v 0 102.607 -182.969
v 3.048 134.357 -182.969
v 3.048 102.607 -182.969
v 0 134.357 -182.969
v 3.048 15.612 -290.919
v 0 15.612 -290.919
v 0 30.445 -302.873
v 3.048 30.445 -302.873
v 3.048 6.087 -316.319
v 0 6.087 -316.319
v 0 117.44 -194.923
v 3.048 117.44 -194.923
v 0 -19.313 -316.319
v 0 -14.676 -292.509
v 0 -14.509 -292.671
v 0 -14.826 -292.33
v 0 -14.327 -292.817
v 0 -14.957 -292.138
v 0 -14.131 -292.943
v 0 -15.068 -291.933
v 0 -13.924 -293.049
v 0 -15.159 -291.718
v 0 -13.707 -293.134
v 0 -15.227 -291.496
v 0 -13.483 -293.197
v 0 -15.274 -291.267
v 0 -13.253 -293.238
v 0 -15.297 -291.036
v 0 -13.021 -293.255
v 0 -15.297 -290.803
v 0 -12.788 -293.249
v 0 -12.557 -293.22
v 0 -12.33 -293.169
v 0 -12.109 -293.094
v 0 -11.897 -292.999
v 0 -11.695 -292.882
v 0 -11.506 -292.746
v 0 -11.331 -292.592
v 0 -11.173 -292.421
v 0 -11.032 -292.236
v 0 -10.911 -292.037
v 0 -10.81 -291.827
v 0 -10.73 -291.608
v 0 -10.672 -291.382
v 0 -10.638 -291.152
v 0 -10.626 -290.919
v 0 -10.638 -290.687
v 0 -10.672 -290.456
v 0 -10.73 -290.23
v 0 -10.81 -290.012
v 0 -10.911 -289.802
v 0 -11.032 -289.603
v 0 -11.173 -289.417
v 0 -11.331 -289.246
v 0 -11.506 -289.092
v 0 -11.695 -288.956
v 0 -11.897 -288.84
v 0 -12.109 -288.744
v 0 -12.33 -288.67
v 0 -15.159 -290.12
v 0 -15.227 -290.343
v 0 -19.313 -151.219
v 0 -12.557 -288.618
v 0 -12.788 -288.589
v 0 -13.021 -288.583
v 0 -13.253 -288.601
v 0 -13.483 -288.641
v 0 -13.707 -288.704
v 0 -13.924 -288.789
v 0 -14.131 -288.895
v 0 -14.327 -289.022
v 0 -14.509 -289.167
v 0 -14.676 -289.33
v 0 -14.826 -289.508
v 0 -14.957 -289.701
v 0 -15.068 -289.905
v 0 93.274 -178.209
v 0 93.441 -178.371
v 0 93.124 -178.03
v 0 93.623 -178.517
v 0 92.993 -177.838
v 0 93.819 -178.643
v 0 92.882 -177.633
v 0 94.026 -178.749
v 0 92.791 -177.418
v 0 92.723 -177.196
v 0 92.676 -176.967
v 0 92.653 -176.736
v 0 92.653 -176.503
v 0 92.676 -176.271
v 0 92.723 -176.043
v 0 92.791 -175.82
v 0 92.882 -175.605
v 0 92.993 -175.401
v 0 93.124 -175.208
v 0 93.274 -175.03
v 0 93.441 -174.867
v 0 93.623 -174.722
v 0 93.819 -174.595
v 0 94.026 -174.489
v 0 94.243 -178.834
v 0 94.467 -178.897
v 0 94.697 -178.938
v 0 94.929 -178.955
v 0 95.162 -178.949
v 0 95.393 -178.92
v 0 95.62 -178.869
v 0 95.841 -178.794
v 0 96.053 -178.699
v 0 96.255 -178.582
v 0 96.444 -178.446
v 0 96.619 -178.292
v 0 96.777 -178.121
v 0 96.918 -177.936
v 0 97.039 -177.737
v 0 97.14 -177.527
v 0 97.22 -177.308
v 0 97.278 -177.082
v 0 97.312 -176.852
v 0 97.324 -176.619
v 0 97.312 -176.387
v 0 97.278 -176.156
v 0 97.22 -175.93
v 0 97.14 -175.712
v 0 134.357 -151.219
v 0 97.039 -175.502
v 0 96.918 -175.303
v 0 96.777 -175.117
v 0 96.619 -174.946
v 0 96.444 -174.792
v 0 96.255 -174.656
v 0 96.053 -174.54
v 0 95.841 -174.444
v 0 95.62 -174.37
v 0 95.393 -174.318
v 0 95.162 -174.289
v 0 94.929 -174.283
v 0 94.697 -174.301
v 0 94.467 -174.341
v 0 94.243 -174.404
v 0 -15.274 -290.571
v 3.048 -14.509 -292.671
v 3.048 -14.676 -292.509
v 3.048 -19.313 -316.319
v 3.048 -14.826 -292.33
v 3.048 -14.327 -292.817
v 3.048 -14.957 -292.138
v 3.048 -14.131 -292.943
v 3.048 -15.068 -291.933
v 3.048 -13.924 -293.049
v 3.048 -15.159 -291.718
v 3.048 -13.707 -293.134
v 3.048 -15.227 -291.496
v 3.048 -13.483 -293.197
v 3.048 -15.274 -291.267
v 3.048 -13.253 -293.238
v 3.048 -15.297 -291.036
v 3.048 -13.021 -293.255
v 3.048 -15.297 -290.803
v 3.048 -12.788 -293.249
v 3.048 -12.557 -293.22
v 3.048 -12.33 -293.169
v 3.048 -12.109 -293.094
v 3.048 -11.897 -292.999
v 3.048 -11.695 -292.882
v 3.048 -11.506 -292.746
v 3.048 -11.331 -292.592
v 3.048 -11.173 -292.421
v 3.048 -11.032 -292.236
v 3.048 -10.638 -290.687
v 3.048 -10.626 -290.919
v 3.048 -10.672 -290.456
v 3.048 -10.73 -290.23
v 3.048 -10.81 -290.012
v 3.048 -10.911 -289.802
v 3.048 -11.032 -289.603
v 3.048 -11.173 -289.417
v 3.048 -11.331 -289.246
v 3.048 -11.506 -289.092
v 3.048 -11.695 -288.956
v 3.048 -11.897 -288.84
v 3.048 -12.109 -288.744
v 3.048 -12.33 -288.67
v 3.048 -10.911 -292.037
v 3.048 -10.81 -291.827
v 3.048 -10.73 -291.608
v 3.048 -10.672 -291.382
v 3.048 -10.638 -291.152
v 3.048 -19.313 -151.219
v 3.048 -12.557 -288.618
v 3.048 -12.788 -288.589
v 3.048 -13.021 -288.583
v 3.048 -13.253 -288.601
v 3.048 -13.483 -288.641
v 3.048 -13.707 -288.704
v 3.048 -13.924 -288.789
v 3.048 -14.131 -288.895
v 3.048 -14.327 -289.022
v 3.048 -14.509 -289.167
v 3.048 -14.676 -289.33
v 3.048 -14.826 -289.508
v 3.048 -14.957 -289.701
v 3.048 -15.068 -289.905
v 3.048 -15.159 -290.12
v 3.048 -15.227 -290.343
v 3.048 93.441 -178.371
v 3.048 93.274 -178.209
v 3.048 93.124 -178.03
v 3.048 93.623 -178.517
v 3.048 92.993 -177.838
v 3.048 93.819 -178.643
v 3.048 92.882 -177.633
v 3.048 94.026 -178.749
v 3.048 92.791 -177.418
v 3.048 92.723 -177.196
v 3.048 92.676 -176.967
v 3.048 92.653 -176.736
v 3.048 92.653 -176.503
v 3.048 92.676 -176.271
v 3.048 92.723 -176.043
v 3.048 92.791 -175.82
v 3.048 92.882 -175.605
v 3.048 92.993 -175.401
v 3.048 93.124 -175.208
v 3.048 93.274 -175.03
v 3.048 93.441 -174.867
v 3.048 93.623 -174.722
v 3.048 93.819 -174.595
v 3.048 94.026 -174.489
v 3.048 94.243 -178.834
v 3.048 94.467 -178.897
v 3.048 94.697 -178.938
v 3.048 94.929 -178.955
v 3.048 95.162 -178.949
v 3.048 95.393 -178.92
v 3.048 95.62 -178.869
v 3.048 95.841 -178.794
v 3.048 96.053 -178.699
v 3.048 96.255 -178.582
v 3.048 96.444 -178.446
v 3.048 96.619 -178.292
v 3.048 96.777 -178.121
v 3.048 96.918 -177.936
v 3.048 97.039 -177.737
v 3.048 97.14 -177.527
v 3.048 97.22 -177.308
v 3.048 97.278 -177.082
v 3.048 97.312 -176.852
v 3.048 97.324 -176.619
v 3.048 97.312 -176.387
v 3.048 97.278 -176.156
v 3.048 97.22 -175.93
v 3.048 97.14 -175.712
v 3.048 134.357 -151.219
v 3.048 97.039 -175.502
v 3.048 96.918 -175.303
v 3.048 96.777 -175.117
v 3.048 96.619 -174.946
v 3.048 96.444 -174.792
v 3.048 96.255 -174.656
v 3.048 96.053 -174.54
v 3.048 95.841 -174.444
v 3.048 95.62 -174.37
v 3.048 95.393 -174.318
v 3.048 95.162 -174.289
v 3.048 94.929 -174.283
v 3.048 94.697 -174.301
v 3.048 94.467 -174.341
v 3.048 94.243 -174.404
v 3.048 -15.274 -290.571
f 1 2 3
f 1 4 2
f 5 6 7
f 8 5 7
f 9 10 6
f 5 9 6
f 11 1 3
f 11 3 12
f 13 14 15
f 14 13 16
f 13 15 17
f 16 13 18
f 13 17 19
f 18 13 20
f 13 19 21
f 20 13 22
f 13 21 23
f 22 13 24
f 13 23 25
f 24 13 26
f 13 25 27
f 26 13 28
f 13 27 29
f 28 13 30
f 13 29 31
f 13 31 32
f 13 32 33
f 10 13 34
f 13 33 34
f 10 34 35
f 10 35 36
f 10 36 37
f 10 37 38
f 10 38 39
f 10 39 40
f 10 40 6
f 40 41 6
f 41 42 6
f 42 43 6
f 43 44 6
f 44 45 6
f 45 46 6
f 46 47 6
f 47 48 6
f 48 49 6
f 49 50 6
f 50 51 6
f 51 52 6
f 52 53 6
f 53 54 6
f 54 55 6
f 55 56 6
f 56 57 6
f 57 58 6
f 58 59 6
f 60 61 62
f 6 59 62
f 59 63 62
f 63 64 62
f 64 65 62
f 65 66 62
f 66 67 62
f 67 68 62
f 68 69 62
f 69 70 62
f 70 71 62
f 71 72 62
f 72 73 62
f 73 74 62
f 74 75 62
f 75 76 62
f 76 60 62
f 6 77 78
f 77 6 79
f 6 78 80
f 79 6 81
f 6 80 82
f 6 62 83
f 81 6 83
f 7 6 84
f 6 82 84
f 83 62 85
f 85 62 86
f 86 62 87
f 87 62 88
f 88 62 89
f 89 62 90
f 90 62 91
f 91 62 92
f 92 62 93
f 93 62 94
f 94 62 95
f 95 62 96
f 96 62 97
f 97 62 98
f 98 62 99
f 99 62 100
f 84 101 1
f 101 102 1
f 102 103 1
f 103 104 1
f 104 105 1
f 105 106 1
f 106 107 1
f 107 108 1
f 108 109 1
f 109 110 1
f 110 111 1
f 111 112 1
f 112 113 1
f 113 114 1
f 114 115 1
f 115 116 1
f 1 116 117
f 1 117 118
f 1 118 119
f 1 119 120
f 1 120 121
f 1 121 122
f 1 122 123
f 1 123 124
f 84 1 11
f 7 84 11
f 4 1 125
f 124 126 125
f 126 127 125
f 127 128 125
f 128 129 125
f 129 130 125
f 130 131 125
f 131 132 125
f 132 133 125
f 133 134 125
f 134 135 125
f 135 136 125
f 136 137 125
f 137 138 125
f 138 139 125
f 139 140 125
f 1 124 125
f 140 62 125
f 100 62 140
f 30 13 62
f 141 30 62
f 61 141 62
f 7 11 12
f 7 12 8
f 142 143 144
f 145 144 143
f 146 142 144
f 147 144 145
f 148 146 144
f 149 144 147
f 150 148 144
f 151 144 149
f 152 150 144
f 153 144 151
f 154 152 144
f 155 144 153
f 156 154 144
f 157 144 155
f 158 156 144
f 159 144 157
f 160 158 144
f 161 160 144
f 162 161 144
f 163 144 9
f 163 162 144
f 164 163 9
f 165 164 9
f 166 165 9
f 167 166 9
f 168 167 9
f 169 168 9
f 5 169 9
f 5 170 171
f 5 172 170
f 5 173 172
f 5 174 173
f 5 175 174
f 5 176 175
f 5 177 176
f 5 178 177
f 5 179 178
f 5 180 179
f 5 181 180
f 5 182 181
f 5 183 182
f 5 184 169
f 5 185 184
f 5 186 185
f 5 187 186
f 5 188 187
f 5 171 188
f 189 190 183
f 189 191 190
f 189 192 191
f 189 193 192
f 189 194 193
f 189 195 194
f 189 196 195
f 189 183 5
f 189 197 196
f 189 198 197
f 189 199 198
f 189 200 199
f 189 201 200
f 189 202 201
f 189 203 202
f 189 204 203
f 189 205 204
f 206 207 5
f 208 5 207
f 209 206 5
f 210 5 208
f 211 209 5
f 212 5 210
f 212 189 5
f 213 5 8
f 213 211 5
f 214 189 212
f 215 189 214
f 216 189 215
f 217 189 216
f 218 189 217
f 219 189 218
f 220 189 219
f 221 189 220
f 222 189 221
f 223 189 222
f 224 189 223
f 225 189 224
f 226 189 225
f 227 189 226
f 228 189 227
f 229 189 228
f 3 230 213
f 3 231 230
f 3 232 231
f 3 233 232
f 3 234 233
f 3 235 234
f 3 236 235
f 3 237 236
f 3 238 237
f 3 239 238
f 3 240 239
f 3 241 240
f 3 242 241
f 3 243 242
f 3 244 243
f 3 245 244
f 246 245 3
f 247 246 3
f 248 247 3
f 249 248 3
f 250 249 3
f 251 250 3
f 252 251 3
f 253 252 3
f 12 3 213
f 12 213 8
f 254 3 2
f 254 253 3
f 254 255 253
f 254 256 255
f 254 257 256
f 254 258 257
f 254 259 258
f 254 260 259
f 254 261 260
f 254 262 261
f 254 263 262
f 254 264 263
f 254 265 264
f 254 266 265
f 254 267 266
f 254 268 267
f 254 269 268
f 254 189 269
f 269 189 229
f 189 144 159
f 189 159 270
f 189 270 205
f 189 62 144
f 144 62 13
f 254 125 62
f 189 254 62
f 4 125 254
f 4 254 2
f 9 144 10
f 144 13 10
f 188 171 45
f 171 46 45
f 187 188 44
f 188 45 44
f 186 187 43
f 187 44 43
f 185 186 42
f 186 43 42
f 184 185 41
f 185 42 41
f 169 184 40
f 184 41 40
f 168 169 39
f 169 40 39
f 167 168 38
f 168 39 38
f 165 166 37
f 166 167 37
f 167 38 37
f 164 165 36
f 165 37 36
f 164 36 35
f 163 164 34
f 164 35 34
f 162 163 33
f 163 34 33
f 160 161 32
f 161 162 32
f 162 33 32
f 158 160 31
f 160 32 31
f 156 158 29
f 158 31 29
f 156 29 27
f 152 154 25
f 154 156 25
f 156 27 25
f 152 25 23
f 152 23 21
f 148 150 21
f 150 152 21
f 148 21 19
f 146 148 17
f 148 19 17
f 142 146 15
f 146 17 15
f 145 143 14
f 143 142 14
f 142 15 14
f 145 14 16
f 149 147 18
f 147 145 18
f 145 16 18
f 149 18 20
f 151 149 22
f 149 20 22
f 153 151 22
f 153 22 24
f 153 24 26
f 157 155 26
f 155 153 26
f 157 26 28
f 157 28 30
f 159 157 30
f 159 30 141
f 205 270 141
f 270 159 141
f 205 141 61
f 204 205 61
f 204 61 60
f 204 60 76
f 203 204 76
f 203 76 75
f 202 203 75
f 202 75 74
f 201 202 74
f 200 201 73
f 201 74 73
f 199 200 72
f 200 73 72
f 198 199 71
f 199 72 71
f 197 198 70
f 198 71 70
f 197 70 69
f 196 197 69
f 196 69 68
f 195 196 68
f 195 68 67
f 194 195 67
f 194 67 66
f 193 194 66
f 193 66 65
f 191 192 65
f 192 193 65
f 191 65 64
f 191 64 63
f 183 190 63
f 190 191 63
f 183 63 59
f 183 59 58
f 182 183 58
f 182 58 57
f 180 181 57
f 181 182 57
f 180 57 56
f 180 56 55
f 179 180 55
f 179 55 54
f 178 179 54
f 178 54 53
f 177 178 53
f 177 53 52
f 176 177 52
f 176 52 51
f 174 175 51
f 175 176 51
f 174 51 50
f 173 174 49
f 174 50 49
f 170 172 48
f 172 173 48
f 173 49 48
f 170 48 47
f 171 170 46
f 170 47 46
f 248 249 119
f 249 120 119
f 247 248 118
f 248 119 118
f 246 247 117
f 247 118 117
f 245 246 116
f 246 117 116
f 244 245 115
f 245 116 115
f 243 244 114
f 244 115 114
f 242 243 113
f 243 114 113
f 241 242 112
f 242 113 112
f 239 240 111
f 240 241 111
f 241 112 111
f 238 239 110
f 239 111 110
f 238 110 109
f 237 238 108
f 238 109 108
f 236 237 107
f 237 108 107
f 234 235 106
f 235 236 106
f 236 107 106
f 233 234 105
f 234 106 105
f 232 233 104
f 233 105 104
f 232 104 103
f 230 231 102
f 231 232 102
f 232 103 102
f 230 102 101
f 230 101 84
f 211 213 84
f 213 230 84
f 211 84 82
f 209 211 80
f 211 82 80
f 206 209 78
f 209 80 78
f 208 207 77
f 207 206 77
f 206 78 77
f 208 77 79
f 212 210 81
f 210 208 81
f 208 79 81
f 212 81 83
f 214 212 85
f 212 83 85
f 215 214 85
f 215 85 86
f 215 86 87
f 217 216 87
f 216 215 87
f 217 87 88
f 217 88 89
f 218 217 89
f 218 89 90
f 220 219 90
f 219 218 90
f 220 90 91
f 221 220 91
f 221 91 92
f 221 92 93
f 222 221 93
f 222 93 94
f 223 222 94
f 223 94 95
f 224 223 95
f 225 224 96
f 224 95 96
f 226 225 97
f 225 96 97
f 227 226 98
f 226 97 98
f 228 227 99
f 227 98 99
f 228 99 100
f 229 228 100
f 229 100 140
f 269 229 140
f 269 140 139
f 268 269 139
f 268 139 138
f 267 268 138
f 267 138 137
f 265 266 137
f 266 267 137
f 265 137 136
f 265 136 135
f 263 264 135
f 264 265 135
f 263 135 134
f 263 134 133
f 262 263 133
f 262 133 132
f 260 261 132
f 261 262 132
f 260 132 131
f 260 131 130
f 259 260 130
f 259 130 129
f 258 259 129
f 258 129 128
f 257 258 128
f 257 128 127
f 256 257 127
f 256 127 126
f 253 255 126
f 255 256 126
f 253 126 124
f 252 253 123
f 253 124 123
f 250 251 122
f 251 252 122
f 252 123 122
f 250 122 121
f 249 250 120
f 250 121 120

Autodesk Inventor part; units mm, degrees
ref_plane "YZ Plane" through (0, 0, 0) normal (1, 0, 0) x (0, 1, 0)
ref_plane "XZ Plane" through (0, 0, 0) normal (0, 1, 0) x (-1, 0, 0)
ref_plane "XY Plane" through (0, 0, 0) normal (0, 0, 1) x (1, 0, 0)
sketch "Sketch1" plane through (0, 0, 0) normal (1, 0, 0) x (0, 1, 0)
  line L0 (6.0871, 13.8808) -> (-19.3129, 13.8808)
  line L1 (-19.3129, 13.8808) -> (-19.3129, -316.3192)
  line L2 (-19.3129, -316.3192) -> (6.0871, -316.3192)
  line L3 (6.0871, -316.3192) -> (6.0871, 13.8808)
  circle A0 centre (-12.9629, -11.5192) radius 2.3368
  circle A1 centre (-12.9629, -290.9192) radius 2.3368
  line L4 (-19.3129, -151.2192) -> (65.5988, -151.2192) construction
  circle A2 centre (94.9871, -125.8192) radius 2.3368
  circle A3 centre (94.9871, -176.6192) radius 2.3368
  line L5 (94.9871, -125.8192) -> (94.9871, -176.6192) construction
  line L6 (-12.9629, -11.5192) -> (-12.9629, -290.9192) construction
  line L7 (102.6071, -119.4692) -> (102.6071, -182.9692)
  line L8 (6.0871, -11.5192) -> (15.6121, -11.5192) construction
  line L9 (6.0871, -290.9192) -> (15.6121, -290.9192) construction
  line L10 (6.0871, 13.8808) -> (15.6121, -11.5192)
  line L11 (6.0871, -316.3192) -> (15.6121, -290.9192)
  line L12 (102.6071, -119.4692) -> (15.6121, -11.5192)
  line L13 (102.6071, -182.9692) -> (15.6121, -290.9192)
  line L14 (102.6071, -119.4692) -> (134.3571, -119.4692)
  line L15 (134.3571, -119.4692) -> (134.3571, -182.9692)
  line L16 (134.3571, -182.9692) -> (102.6071, -182.9692)
  line L17 (102.6071, -182.9692) -> (102.6071, -119.4692)
  line L18 (102.6071, -182.9692) -> (117.44, -194.9228)
  line L19 (15.6121, -290.9192) -> (30.445, -302.8728)
  line L20 (117.44, -194.9228) -> (30.445, -302.8728)
  line L21 (102.6071, -119.4692) -> (117.44, -107.5156)
  line L22 (117.44, -107.5156) -> (30.445, 0.4344)
  line L23 (30.445, 0.4344) -> (15.6121, -11.5192)
  point P0 (0, 0)
  dimension "d0" = 25.4
  dimension "d1" = 330.2
  dimension "d2" = 4.6736
  dimension "d3" = 4.6736
  dimension "d4" = 279.4
  dimension "d5" = 25.4
  dimension "d6" = 6.35
  dimension "d7" = 84.9117
  dimension "d8" = 4.6736
  dimension "d9" = 4.6736
  dimension "d10" = 50.8
  dimension "d11" = 25.4
  dimension "d12" = 107.95
  dimension "d13" = 7.62
  dimension "d14" = 9.525
  dimension "d15" = 9.525
  dimension "d16" = 63.5
  dimension "d17" = 6.35
  dimension "d18" = 31.75
  dimension "d19" = 19.05
  dimension "d20" = 19.05
ref_plane "Work Plane1" through (1.5875, 0, 0) normal (1, 0, 0) x (0, 0, -1)
extrude "Plate1" add sketch "Sketch1" along normal blind 3.048
sketch "Sketch3" plane through (0, 0, 0) normal (-1, 0, 0) x (0, 0, 1)
  circle A0 centre (-176.6192, 94.9871) radius 2.3368 projected
  circle A1 centre (-125.8192, 94.9871) radius 2.3368 projected
  circle A2 centre (-11.5192, -12.9629) radius 2.3368 projected
  circle A3 centre (-290.9192, -12.9629) radius 2.3368 projected
  line L0 (-107.5156, 117.44) -> (0.4344, 30.445) projected
  line L1 (-119.4692, 102.6071) -> (-107.5156, 117.44) projected
  line L2 (-119.4692, 134.3571) -> (-119.4692, 102.6071) projected
  line L3 (-182.9692, 134.3571) -> (-119.4692, 134.3571) projected
  line L4 (-182.9692, 102.6071) -> (-182.9692, 134.3571) projected
  line L5 (-194.9228, 117.44) -> (-182.9692, 102.6071) projected
  line L6 (-302.8728, 30.445) -> (-194.9228, 117.44) projected
  line L7 (-290.9192, 15.6121) -> (-302.8728, 30.445) projected
  line L8 (-316.3192, 6.0871) -> (-290.9192, 15.6121) projected
  line L9 (-316.3192, -19.3129) -> (-316.3192, 6.0871) projected
  line L10 (13.8808, -19.3129) -> (-316.3192, -19.3129) projected
  line L11 (13.8808, 6.0871) -> (13.8808, -19.3129) projected
  line L12 (-11.5192, 15.6121) -> (13.8808, 6.0871) projected
  line L13 (0.4344, 30.445) -> (-11.5192, 15.6121) projected
  line L14 (-151.2192, 134.3571) -> (-151.2192, -19.3129)
  point P0 (0, 0)
extrude "Cut1" cut sketch "Sketch3" against normal blind 3.048 contours L0 L13 L12 L11 L10 L14 L3 L2 L1
equation "\"d24\" = Thickness"
equation "\"d23\" = Thickness"
equation "\"BendRadius\" = Thickness"
equation "\"BendReliefWidth\" = Thickness"
equation "\"BendReliefDepth\" = 0.5 * Thickness"
equation "\"CornerReliefSize\" = 4 * Thickness"
equation "\"MinimumRemnant\" = 2 * Thickness"
equation "\"TransitionRadius\" = BendRadius"
equation "\"JacobiRadiusSize\" = BendRadius"
equation "\"GapSize\" = Thickness"
equation "\"Thickness\" = 3.048"
properties part number "backpanel"
